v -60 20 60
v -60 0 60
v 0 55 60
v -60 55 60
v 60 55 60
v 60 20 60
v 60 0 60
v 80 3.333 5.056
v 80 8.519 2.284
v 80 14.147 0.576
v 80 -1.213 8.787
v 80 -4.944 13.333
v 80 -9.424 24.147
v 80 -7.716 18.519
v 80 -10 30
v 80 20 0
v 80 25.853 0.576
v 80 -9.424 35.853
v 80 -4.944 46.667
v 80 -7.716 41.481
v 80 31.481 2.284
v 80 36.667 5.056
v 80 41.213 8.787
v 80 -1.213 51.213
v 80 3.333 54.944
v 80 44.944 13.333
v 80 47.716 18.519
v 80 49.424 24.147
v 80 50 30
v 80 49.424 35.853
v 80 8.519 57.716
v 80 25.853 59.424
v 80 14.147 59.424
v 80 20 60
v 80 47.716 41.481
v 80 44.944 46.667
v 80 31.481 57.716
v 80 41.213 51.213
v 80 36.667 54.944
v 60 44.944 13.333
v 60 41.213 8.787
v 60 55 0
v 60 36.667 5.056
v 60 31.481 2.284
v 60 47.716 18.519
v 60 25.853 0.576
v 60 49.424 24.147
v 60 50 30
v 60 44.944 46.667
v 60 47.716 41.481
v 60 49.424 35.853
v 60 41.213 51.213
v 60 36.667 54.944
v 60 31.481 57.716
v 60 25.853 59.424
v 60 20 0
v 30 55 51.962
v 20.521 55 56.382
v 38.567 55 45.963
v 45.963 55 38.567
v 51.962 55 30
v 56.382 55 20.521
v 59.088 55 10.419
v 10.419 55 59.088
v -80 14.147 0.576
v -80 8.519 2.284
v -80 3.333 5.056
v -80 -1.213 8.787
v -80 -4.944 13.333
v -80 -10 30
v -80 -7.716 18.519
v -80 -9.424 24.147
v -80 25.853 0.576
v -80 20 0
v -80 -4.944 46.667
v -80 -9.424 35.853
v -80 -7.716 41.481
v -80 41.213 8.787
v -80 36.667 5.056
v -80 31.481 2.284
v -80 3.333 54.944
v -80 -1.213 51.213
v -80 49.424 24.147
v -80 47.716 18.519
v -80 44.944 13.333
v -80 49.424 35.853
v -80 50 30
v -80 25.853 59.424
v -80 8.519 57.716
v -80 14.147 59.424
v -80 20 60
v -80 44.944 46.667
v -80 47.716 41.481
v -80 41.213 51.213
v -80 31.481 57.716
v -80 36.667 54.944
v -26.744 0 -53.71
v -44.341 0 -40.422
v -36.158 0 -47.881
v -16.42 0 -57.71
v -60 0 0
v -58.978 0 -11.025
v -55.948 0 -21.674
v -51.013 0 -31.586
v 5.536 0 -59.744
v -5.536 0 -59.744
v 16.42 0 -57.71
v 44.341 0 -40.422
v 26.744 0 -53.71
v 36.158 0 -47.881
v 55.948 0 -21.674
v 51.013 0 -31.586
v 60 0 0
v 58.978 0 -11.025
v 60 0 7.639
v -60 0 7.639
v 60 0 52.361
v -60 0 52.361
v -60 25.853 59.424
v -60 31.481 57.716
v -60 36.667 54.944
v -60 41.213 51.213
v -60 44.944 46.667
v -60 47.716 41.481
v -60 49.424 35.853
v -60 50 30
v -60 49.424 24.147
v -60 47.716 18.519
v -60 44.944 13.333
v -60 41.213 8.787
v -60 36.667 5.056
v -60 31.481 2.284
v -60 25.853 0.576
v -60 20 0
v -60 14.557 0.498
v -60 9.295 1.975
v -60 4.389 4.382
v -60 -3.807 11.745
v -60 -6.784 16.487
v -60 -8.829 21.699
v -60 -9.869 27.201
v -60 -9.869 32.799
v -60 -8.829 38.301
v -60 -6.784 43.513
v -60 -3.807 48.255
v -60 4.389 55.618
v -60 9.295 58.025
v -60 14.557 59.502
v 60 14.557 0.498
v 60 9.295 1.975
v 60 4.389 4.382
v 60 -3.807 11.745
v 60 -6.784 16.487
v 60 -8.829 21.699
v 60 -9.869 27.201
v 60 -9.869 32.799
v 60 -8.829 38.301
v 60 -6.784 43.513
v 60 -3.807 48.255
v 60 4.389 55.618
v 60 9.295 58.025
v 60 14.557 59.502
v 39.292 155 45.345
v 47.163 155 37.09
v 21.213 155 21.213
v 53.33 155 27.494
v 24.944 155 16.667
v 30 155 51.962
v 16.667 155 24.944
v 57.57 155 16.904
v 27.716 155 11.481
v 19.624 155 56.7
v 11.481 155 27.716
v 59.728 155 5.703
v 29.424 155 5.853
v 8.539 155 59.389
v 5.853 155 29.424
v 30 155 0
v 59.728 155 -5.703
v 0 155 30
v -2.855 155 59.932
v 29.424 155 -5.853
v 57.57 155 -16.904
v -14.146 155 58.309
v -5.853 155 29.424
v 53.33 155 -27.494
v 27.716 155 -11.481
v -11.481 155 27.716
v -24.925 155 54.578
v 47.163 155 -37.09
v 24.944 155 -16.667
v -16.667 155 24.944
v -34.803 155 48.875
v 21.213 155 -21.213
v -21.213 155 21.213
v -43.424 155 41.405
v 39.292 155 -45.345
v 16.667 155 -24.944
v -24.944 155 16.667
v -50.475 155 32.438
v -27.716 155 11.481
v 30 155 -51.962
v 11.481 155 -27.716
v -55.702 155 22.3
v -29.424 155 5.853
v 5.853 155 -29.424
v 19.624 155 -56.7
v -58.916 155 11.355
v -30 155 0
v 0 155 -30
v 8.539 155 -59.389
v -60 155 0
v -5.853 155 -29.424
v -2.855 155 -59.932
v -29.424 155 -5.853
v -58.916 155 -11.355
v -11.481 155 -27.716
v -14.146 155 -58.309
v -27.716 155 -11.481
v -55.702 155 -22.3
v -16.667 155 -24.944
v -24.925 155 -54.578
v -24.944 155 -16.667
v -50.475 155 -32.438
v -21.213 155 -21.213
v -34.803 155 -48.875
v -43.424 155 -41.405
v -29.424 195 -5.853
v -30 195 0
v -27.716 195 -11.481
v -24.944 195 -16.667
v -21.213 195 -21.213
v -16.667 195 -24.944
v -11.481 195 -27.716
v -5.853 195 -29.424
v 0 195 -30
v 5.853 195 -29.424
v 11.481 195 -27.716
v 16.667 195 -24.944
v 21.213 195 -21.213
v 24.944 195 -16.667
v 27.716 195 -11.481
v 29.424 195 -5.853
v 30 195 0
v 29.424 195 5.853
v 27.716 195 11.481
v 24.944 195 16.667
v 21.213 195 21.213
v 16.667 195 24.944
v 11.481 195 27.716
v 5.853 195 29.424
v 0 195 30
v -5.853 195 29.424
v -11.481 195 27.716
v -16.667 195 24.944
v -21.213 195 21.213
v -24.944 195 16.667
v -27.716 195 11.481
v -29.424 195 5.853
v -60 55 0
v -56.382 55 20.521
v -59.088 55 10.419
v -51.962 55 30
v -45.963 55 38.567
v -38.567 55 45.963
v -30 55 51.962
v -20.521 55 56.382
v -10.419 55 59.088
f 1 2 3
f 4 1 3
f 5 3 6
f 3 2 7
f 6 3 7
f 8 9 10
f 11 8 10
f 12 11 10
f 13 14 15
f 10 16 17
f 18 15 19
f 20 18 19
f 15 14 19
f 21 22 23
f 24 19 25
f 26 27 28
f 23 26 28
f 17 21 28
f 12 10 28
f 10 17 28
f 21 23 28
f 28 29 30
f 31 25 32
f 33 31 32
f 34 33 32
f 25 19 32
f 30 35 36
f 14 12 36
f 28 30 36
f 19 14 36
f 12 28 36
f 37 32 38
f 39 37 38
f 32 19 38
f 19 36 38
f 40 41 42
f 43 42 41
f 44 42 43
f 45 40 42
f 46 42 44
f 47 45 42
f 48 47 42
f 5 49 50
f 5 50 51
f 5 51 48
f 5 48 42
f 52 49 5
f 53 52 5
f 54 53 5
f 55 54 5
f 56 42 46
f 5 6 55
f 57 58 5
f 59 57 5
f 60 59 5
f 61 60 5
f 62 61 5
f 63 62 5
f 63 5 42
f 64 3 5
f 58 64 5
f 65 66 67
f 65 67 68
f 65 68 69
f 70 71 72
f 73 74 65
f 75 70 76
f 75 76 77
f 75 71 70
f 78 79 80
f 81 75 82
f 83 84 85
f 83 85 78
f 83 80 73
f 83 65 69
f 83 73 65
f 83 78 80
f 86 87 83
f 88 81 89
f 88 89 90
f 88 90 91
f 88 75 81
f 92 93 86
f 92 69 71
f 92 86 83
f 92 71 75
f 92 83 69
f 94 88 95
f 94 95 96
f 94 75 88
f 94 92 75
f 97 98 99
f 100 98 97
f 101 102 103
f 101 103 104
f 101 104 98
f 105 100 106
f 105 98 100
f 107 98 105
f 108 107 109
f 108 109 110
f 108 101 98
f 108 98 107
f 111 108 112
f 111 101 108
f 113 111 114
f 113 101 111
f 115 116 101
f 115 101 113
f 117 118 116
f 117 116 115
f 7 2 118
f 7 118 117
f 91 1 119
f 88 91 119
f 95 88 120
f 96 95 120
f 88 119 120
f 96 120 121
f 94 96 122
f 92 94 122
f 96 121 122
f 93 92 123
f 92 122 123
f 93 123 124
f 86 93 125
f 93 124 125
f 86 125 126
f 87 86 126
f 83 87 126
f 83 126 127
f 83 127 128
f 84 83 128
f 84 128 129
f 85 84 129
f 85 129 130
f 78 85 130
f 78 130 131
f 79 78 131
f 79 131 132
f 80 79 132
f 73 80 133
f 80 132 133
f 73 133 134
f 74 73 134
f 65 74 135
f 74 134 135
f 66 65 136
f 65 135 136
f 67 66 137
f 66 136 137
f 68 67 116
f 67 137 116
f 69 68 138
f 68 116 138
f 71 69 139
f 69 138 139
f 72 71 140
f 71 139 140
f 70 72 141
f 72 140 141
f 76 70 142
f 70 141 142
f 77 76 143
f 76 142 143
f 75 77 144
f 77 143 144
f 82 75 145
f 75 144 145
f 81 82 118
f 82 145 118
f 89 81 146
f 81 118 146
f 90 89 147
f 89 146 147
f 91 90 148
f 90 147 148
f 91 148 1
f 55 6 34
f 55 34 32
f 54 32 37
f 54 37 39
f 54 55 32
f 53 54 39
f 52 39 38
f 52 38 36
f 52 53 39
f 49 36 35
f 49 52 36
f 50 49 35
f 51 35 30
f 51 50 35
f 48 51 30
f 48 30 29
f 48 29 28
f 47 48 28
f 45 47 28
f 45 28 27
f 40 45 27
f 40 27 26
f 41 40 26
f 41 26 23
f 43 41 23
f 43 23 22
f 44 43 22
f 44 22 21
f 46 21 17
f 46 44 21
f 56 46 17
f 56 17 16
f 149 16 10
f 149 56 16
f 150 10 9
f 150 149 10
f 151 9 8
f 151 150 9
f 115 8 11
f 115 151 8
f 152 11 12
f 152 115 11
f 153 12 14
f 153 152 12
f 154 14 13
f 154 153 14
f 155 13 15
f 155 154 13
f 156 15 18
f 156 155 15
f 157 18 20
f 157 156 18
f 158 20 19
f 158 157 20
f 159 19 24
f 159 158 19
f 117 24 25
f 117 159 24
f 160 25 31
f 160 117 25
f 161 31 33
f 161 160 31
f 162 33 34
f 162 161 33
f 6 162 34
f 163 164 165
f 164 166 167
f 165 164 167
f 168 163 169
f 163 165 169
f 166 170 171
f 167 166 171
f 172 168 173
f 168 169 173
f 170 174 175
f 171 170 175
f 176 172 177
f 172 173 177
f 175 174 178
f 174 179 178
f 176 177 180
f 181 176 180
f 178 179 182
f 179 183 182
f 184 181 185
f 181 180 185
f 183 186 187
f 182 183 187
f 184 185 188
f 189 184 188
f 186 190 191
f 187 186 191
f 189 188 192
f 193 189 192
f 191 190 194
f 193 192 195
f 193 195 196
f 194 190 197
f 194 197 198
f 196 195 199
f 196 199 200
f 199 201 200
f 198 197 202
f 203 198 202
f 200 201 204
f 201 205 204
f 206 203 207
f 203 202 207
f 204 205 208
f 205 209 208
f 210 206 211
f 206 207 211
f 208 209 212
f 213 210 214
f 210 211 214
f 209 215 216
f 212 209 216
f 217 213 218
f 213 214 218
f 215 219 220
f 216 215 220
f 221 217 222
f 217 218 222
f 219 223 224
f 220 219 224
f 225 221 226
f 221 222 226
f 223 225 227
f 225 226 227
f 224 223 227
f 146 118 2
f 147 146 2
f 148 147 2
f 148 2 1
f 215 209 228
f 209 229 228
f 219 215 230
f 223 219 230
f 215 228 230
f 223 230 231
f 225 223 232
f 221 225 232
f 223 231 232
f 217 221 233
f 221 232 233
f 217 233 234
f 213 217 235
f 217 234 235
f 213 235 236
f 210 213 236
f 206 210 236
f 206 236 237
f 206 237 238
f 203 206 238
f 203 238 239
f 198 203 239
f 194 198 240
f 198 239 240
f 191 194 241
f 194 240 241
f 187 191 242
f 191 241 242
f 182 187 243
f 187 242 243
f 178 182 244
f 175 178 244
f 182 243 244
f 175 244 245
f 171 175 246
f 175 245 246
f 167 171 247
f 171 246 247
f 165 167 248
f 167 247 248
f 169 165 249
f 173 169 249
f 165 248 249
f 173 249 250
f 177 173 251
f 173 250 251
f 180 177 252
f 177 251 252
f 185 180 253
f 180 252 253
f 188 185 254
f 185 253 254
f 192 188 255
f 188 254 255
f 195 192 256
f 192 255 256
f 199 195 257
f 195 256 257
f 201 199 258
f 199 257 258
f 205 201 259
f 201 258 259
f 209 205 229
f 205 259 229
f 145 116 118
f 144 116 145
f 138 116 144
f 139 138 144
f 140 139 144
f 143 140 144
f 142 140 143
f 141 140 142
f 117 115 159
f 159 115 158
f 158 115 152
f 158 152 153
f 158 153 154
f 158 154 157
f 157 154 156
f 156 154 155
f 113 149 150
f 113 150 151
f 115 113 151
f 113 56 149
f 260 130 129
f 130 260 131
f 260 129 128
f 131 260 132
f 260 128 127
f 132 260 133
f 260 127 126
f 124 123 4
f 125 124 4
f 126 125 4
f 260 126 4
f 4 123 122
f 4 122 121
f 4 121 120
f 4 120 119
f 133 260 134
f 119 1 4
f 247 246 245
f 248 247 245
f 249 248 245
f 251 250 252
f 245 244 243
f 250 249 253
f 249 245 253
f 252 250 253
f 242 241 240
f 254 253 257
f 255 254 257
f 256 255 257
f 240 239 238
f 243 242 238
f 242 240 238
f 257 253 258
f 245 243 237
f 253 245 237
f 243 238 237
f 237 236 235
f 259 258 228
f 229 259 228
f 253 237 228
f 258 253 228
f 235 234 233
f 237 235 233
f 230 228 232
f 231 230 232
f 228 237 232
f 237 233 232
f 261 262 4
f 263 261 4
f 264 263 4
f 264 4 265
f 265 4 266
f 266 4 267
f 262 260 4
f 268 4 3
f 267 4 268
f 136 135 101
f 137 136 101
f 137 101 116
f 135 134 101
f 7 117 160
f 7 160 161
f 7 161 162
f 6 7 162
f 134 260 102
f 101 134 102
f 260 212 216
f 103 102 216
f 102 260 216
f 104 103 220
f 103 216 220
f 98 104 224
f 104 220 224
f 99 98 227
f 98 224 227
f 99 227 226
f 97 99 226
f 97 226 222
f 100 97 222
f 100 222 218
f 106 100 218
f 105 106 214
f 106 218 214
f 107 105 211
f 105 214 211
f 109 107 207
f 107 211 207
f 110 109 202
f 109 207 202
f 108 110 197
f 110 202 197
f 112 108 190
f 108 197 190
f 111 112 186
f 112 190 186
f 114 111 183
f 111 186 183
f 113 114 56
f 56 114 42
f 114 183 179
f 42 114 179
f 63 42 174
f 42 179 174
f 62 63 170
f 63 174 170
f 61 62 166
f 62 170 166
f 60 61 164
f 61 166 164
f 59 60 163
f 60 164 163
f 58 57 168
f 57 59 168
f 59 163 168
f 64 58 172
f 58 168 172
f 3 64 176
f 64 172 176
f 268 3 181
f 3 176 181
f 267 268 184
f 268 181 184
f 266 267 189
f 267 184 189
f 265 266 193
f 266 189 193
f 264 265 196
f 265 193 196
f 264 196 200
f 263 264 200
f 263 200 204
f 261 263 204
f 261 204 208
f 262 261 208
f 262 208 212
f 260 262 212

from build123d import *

# Parameters (mm, degrees)
ESQUISSE2_W        = 120
ESQUISSE2_H        = 60
BOSS_EXTRU_1_DEPTH = 55
ESQUISSE3_R        = 30
BOSS_EXTRU_2_DEPTH = 20


with BuildPart() as part:
    # Esquisse1 → Révolution1 (revolve)
    with BuildSketch(Plane.XY):
        Polygon((0, 0), (-60, 0), (-60, 155), (-30, 155), (-30, 195), (0, 195), align=None)
    revolve(axis=Axis((0, 195, 0), (0, -1, 0)))

    # Esquisse2 → Boss.-Extru.1 (add)
    with BuildSketch(Plane.XZ):
        with Locations((0, 30)):
            Rectangle(ESQUISSE2_W, ESQUISSE2_H)
    extrude(amount=-BOSS_EXTRU_1_DEPTH)

    # Esquisse3 → Boss.-Extru.2 (add)
    with BuildSketch(Plane.ZY.offset(60)):
        with Locations((30, 20)):
            Circle(ESQUISSE3_R)
    boss_extru_2 = extrude(amount=BOSS_EXTRU_2_DEPTH)

    # Symétrie1: Boss.-Extru.2 across plane
    add(boss_extru_2.mirror(Plane(origin=(0, 0, 0), x_dir=(0, 0, 1), z_dir=(1, 0, 0))))


solid = part.part
